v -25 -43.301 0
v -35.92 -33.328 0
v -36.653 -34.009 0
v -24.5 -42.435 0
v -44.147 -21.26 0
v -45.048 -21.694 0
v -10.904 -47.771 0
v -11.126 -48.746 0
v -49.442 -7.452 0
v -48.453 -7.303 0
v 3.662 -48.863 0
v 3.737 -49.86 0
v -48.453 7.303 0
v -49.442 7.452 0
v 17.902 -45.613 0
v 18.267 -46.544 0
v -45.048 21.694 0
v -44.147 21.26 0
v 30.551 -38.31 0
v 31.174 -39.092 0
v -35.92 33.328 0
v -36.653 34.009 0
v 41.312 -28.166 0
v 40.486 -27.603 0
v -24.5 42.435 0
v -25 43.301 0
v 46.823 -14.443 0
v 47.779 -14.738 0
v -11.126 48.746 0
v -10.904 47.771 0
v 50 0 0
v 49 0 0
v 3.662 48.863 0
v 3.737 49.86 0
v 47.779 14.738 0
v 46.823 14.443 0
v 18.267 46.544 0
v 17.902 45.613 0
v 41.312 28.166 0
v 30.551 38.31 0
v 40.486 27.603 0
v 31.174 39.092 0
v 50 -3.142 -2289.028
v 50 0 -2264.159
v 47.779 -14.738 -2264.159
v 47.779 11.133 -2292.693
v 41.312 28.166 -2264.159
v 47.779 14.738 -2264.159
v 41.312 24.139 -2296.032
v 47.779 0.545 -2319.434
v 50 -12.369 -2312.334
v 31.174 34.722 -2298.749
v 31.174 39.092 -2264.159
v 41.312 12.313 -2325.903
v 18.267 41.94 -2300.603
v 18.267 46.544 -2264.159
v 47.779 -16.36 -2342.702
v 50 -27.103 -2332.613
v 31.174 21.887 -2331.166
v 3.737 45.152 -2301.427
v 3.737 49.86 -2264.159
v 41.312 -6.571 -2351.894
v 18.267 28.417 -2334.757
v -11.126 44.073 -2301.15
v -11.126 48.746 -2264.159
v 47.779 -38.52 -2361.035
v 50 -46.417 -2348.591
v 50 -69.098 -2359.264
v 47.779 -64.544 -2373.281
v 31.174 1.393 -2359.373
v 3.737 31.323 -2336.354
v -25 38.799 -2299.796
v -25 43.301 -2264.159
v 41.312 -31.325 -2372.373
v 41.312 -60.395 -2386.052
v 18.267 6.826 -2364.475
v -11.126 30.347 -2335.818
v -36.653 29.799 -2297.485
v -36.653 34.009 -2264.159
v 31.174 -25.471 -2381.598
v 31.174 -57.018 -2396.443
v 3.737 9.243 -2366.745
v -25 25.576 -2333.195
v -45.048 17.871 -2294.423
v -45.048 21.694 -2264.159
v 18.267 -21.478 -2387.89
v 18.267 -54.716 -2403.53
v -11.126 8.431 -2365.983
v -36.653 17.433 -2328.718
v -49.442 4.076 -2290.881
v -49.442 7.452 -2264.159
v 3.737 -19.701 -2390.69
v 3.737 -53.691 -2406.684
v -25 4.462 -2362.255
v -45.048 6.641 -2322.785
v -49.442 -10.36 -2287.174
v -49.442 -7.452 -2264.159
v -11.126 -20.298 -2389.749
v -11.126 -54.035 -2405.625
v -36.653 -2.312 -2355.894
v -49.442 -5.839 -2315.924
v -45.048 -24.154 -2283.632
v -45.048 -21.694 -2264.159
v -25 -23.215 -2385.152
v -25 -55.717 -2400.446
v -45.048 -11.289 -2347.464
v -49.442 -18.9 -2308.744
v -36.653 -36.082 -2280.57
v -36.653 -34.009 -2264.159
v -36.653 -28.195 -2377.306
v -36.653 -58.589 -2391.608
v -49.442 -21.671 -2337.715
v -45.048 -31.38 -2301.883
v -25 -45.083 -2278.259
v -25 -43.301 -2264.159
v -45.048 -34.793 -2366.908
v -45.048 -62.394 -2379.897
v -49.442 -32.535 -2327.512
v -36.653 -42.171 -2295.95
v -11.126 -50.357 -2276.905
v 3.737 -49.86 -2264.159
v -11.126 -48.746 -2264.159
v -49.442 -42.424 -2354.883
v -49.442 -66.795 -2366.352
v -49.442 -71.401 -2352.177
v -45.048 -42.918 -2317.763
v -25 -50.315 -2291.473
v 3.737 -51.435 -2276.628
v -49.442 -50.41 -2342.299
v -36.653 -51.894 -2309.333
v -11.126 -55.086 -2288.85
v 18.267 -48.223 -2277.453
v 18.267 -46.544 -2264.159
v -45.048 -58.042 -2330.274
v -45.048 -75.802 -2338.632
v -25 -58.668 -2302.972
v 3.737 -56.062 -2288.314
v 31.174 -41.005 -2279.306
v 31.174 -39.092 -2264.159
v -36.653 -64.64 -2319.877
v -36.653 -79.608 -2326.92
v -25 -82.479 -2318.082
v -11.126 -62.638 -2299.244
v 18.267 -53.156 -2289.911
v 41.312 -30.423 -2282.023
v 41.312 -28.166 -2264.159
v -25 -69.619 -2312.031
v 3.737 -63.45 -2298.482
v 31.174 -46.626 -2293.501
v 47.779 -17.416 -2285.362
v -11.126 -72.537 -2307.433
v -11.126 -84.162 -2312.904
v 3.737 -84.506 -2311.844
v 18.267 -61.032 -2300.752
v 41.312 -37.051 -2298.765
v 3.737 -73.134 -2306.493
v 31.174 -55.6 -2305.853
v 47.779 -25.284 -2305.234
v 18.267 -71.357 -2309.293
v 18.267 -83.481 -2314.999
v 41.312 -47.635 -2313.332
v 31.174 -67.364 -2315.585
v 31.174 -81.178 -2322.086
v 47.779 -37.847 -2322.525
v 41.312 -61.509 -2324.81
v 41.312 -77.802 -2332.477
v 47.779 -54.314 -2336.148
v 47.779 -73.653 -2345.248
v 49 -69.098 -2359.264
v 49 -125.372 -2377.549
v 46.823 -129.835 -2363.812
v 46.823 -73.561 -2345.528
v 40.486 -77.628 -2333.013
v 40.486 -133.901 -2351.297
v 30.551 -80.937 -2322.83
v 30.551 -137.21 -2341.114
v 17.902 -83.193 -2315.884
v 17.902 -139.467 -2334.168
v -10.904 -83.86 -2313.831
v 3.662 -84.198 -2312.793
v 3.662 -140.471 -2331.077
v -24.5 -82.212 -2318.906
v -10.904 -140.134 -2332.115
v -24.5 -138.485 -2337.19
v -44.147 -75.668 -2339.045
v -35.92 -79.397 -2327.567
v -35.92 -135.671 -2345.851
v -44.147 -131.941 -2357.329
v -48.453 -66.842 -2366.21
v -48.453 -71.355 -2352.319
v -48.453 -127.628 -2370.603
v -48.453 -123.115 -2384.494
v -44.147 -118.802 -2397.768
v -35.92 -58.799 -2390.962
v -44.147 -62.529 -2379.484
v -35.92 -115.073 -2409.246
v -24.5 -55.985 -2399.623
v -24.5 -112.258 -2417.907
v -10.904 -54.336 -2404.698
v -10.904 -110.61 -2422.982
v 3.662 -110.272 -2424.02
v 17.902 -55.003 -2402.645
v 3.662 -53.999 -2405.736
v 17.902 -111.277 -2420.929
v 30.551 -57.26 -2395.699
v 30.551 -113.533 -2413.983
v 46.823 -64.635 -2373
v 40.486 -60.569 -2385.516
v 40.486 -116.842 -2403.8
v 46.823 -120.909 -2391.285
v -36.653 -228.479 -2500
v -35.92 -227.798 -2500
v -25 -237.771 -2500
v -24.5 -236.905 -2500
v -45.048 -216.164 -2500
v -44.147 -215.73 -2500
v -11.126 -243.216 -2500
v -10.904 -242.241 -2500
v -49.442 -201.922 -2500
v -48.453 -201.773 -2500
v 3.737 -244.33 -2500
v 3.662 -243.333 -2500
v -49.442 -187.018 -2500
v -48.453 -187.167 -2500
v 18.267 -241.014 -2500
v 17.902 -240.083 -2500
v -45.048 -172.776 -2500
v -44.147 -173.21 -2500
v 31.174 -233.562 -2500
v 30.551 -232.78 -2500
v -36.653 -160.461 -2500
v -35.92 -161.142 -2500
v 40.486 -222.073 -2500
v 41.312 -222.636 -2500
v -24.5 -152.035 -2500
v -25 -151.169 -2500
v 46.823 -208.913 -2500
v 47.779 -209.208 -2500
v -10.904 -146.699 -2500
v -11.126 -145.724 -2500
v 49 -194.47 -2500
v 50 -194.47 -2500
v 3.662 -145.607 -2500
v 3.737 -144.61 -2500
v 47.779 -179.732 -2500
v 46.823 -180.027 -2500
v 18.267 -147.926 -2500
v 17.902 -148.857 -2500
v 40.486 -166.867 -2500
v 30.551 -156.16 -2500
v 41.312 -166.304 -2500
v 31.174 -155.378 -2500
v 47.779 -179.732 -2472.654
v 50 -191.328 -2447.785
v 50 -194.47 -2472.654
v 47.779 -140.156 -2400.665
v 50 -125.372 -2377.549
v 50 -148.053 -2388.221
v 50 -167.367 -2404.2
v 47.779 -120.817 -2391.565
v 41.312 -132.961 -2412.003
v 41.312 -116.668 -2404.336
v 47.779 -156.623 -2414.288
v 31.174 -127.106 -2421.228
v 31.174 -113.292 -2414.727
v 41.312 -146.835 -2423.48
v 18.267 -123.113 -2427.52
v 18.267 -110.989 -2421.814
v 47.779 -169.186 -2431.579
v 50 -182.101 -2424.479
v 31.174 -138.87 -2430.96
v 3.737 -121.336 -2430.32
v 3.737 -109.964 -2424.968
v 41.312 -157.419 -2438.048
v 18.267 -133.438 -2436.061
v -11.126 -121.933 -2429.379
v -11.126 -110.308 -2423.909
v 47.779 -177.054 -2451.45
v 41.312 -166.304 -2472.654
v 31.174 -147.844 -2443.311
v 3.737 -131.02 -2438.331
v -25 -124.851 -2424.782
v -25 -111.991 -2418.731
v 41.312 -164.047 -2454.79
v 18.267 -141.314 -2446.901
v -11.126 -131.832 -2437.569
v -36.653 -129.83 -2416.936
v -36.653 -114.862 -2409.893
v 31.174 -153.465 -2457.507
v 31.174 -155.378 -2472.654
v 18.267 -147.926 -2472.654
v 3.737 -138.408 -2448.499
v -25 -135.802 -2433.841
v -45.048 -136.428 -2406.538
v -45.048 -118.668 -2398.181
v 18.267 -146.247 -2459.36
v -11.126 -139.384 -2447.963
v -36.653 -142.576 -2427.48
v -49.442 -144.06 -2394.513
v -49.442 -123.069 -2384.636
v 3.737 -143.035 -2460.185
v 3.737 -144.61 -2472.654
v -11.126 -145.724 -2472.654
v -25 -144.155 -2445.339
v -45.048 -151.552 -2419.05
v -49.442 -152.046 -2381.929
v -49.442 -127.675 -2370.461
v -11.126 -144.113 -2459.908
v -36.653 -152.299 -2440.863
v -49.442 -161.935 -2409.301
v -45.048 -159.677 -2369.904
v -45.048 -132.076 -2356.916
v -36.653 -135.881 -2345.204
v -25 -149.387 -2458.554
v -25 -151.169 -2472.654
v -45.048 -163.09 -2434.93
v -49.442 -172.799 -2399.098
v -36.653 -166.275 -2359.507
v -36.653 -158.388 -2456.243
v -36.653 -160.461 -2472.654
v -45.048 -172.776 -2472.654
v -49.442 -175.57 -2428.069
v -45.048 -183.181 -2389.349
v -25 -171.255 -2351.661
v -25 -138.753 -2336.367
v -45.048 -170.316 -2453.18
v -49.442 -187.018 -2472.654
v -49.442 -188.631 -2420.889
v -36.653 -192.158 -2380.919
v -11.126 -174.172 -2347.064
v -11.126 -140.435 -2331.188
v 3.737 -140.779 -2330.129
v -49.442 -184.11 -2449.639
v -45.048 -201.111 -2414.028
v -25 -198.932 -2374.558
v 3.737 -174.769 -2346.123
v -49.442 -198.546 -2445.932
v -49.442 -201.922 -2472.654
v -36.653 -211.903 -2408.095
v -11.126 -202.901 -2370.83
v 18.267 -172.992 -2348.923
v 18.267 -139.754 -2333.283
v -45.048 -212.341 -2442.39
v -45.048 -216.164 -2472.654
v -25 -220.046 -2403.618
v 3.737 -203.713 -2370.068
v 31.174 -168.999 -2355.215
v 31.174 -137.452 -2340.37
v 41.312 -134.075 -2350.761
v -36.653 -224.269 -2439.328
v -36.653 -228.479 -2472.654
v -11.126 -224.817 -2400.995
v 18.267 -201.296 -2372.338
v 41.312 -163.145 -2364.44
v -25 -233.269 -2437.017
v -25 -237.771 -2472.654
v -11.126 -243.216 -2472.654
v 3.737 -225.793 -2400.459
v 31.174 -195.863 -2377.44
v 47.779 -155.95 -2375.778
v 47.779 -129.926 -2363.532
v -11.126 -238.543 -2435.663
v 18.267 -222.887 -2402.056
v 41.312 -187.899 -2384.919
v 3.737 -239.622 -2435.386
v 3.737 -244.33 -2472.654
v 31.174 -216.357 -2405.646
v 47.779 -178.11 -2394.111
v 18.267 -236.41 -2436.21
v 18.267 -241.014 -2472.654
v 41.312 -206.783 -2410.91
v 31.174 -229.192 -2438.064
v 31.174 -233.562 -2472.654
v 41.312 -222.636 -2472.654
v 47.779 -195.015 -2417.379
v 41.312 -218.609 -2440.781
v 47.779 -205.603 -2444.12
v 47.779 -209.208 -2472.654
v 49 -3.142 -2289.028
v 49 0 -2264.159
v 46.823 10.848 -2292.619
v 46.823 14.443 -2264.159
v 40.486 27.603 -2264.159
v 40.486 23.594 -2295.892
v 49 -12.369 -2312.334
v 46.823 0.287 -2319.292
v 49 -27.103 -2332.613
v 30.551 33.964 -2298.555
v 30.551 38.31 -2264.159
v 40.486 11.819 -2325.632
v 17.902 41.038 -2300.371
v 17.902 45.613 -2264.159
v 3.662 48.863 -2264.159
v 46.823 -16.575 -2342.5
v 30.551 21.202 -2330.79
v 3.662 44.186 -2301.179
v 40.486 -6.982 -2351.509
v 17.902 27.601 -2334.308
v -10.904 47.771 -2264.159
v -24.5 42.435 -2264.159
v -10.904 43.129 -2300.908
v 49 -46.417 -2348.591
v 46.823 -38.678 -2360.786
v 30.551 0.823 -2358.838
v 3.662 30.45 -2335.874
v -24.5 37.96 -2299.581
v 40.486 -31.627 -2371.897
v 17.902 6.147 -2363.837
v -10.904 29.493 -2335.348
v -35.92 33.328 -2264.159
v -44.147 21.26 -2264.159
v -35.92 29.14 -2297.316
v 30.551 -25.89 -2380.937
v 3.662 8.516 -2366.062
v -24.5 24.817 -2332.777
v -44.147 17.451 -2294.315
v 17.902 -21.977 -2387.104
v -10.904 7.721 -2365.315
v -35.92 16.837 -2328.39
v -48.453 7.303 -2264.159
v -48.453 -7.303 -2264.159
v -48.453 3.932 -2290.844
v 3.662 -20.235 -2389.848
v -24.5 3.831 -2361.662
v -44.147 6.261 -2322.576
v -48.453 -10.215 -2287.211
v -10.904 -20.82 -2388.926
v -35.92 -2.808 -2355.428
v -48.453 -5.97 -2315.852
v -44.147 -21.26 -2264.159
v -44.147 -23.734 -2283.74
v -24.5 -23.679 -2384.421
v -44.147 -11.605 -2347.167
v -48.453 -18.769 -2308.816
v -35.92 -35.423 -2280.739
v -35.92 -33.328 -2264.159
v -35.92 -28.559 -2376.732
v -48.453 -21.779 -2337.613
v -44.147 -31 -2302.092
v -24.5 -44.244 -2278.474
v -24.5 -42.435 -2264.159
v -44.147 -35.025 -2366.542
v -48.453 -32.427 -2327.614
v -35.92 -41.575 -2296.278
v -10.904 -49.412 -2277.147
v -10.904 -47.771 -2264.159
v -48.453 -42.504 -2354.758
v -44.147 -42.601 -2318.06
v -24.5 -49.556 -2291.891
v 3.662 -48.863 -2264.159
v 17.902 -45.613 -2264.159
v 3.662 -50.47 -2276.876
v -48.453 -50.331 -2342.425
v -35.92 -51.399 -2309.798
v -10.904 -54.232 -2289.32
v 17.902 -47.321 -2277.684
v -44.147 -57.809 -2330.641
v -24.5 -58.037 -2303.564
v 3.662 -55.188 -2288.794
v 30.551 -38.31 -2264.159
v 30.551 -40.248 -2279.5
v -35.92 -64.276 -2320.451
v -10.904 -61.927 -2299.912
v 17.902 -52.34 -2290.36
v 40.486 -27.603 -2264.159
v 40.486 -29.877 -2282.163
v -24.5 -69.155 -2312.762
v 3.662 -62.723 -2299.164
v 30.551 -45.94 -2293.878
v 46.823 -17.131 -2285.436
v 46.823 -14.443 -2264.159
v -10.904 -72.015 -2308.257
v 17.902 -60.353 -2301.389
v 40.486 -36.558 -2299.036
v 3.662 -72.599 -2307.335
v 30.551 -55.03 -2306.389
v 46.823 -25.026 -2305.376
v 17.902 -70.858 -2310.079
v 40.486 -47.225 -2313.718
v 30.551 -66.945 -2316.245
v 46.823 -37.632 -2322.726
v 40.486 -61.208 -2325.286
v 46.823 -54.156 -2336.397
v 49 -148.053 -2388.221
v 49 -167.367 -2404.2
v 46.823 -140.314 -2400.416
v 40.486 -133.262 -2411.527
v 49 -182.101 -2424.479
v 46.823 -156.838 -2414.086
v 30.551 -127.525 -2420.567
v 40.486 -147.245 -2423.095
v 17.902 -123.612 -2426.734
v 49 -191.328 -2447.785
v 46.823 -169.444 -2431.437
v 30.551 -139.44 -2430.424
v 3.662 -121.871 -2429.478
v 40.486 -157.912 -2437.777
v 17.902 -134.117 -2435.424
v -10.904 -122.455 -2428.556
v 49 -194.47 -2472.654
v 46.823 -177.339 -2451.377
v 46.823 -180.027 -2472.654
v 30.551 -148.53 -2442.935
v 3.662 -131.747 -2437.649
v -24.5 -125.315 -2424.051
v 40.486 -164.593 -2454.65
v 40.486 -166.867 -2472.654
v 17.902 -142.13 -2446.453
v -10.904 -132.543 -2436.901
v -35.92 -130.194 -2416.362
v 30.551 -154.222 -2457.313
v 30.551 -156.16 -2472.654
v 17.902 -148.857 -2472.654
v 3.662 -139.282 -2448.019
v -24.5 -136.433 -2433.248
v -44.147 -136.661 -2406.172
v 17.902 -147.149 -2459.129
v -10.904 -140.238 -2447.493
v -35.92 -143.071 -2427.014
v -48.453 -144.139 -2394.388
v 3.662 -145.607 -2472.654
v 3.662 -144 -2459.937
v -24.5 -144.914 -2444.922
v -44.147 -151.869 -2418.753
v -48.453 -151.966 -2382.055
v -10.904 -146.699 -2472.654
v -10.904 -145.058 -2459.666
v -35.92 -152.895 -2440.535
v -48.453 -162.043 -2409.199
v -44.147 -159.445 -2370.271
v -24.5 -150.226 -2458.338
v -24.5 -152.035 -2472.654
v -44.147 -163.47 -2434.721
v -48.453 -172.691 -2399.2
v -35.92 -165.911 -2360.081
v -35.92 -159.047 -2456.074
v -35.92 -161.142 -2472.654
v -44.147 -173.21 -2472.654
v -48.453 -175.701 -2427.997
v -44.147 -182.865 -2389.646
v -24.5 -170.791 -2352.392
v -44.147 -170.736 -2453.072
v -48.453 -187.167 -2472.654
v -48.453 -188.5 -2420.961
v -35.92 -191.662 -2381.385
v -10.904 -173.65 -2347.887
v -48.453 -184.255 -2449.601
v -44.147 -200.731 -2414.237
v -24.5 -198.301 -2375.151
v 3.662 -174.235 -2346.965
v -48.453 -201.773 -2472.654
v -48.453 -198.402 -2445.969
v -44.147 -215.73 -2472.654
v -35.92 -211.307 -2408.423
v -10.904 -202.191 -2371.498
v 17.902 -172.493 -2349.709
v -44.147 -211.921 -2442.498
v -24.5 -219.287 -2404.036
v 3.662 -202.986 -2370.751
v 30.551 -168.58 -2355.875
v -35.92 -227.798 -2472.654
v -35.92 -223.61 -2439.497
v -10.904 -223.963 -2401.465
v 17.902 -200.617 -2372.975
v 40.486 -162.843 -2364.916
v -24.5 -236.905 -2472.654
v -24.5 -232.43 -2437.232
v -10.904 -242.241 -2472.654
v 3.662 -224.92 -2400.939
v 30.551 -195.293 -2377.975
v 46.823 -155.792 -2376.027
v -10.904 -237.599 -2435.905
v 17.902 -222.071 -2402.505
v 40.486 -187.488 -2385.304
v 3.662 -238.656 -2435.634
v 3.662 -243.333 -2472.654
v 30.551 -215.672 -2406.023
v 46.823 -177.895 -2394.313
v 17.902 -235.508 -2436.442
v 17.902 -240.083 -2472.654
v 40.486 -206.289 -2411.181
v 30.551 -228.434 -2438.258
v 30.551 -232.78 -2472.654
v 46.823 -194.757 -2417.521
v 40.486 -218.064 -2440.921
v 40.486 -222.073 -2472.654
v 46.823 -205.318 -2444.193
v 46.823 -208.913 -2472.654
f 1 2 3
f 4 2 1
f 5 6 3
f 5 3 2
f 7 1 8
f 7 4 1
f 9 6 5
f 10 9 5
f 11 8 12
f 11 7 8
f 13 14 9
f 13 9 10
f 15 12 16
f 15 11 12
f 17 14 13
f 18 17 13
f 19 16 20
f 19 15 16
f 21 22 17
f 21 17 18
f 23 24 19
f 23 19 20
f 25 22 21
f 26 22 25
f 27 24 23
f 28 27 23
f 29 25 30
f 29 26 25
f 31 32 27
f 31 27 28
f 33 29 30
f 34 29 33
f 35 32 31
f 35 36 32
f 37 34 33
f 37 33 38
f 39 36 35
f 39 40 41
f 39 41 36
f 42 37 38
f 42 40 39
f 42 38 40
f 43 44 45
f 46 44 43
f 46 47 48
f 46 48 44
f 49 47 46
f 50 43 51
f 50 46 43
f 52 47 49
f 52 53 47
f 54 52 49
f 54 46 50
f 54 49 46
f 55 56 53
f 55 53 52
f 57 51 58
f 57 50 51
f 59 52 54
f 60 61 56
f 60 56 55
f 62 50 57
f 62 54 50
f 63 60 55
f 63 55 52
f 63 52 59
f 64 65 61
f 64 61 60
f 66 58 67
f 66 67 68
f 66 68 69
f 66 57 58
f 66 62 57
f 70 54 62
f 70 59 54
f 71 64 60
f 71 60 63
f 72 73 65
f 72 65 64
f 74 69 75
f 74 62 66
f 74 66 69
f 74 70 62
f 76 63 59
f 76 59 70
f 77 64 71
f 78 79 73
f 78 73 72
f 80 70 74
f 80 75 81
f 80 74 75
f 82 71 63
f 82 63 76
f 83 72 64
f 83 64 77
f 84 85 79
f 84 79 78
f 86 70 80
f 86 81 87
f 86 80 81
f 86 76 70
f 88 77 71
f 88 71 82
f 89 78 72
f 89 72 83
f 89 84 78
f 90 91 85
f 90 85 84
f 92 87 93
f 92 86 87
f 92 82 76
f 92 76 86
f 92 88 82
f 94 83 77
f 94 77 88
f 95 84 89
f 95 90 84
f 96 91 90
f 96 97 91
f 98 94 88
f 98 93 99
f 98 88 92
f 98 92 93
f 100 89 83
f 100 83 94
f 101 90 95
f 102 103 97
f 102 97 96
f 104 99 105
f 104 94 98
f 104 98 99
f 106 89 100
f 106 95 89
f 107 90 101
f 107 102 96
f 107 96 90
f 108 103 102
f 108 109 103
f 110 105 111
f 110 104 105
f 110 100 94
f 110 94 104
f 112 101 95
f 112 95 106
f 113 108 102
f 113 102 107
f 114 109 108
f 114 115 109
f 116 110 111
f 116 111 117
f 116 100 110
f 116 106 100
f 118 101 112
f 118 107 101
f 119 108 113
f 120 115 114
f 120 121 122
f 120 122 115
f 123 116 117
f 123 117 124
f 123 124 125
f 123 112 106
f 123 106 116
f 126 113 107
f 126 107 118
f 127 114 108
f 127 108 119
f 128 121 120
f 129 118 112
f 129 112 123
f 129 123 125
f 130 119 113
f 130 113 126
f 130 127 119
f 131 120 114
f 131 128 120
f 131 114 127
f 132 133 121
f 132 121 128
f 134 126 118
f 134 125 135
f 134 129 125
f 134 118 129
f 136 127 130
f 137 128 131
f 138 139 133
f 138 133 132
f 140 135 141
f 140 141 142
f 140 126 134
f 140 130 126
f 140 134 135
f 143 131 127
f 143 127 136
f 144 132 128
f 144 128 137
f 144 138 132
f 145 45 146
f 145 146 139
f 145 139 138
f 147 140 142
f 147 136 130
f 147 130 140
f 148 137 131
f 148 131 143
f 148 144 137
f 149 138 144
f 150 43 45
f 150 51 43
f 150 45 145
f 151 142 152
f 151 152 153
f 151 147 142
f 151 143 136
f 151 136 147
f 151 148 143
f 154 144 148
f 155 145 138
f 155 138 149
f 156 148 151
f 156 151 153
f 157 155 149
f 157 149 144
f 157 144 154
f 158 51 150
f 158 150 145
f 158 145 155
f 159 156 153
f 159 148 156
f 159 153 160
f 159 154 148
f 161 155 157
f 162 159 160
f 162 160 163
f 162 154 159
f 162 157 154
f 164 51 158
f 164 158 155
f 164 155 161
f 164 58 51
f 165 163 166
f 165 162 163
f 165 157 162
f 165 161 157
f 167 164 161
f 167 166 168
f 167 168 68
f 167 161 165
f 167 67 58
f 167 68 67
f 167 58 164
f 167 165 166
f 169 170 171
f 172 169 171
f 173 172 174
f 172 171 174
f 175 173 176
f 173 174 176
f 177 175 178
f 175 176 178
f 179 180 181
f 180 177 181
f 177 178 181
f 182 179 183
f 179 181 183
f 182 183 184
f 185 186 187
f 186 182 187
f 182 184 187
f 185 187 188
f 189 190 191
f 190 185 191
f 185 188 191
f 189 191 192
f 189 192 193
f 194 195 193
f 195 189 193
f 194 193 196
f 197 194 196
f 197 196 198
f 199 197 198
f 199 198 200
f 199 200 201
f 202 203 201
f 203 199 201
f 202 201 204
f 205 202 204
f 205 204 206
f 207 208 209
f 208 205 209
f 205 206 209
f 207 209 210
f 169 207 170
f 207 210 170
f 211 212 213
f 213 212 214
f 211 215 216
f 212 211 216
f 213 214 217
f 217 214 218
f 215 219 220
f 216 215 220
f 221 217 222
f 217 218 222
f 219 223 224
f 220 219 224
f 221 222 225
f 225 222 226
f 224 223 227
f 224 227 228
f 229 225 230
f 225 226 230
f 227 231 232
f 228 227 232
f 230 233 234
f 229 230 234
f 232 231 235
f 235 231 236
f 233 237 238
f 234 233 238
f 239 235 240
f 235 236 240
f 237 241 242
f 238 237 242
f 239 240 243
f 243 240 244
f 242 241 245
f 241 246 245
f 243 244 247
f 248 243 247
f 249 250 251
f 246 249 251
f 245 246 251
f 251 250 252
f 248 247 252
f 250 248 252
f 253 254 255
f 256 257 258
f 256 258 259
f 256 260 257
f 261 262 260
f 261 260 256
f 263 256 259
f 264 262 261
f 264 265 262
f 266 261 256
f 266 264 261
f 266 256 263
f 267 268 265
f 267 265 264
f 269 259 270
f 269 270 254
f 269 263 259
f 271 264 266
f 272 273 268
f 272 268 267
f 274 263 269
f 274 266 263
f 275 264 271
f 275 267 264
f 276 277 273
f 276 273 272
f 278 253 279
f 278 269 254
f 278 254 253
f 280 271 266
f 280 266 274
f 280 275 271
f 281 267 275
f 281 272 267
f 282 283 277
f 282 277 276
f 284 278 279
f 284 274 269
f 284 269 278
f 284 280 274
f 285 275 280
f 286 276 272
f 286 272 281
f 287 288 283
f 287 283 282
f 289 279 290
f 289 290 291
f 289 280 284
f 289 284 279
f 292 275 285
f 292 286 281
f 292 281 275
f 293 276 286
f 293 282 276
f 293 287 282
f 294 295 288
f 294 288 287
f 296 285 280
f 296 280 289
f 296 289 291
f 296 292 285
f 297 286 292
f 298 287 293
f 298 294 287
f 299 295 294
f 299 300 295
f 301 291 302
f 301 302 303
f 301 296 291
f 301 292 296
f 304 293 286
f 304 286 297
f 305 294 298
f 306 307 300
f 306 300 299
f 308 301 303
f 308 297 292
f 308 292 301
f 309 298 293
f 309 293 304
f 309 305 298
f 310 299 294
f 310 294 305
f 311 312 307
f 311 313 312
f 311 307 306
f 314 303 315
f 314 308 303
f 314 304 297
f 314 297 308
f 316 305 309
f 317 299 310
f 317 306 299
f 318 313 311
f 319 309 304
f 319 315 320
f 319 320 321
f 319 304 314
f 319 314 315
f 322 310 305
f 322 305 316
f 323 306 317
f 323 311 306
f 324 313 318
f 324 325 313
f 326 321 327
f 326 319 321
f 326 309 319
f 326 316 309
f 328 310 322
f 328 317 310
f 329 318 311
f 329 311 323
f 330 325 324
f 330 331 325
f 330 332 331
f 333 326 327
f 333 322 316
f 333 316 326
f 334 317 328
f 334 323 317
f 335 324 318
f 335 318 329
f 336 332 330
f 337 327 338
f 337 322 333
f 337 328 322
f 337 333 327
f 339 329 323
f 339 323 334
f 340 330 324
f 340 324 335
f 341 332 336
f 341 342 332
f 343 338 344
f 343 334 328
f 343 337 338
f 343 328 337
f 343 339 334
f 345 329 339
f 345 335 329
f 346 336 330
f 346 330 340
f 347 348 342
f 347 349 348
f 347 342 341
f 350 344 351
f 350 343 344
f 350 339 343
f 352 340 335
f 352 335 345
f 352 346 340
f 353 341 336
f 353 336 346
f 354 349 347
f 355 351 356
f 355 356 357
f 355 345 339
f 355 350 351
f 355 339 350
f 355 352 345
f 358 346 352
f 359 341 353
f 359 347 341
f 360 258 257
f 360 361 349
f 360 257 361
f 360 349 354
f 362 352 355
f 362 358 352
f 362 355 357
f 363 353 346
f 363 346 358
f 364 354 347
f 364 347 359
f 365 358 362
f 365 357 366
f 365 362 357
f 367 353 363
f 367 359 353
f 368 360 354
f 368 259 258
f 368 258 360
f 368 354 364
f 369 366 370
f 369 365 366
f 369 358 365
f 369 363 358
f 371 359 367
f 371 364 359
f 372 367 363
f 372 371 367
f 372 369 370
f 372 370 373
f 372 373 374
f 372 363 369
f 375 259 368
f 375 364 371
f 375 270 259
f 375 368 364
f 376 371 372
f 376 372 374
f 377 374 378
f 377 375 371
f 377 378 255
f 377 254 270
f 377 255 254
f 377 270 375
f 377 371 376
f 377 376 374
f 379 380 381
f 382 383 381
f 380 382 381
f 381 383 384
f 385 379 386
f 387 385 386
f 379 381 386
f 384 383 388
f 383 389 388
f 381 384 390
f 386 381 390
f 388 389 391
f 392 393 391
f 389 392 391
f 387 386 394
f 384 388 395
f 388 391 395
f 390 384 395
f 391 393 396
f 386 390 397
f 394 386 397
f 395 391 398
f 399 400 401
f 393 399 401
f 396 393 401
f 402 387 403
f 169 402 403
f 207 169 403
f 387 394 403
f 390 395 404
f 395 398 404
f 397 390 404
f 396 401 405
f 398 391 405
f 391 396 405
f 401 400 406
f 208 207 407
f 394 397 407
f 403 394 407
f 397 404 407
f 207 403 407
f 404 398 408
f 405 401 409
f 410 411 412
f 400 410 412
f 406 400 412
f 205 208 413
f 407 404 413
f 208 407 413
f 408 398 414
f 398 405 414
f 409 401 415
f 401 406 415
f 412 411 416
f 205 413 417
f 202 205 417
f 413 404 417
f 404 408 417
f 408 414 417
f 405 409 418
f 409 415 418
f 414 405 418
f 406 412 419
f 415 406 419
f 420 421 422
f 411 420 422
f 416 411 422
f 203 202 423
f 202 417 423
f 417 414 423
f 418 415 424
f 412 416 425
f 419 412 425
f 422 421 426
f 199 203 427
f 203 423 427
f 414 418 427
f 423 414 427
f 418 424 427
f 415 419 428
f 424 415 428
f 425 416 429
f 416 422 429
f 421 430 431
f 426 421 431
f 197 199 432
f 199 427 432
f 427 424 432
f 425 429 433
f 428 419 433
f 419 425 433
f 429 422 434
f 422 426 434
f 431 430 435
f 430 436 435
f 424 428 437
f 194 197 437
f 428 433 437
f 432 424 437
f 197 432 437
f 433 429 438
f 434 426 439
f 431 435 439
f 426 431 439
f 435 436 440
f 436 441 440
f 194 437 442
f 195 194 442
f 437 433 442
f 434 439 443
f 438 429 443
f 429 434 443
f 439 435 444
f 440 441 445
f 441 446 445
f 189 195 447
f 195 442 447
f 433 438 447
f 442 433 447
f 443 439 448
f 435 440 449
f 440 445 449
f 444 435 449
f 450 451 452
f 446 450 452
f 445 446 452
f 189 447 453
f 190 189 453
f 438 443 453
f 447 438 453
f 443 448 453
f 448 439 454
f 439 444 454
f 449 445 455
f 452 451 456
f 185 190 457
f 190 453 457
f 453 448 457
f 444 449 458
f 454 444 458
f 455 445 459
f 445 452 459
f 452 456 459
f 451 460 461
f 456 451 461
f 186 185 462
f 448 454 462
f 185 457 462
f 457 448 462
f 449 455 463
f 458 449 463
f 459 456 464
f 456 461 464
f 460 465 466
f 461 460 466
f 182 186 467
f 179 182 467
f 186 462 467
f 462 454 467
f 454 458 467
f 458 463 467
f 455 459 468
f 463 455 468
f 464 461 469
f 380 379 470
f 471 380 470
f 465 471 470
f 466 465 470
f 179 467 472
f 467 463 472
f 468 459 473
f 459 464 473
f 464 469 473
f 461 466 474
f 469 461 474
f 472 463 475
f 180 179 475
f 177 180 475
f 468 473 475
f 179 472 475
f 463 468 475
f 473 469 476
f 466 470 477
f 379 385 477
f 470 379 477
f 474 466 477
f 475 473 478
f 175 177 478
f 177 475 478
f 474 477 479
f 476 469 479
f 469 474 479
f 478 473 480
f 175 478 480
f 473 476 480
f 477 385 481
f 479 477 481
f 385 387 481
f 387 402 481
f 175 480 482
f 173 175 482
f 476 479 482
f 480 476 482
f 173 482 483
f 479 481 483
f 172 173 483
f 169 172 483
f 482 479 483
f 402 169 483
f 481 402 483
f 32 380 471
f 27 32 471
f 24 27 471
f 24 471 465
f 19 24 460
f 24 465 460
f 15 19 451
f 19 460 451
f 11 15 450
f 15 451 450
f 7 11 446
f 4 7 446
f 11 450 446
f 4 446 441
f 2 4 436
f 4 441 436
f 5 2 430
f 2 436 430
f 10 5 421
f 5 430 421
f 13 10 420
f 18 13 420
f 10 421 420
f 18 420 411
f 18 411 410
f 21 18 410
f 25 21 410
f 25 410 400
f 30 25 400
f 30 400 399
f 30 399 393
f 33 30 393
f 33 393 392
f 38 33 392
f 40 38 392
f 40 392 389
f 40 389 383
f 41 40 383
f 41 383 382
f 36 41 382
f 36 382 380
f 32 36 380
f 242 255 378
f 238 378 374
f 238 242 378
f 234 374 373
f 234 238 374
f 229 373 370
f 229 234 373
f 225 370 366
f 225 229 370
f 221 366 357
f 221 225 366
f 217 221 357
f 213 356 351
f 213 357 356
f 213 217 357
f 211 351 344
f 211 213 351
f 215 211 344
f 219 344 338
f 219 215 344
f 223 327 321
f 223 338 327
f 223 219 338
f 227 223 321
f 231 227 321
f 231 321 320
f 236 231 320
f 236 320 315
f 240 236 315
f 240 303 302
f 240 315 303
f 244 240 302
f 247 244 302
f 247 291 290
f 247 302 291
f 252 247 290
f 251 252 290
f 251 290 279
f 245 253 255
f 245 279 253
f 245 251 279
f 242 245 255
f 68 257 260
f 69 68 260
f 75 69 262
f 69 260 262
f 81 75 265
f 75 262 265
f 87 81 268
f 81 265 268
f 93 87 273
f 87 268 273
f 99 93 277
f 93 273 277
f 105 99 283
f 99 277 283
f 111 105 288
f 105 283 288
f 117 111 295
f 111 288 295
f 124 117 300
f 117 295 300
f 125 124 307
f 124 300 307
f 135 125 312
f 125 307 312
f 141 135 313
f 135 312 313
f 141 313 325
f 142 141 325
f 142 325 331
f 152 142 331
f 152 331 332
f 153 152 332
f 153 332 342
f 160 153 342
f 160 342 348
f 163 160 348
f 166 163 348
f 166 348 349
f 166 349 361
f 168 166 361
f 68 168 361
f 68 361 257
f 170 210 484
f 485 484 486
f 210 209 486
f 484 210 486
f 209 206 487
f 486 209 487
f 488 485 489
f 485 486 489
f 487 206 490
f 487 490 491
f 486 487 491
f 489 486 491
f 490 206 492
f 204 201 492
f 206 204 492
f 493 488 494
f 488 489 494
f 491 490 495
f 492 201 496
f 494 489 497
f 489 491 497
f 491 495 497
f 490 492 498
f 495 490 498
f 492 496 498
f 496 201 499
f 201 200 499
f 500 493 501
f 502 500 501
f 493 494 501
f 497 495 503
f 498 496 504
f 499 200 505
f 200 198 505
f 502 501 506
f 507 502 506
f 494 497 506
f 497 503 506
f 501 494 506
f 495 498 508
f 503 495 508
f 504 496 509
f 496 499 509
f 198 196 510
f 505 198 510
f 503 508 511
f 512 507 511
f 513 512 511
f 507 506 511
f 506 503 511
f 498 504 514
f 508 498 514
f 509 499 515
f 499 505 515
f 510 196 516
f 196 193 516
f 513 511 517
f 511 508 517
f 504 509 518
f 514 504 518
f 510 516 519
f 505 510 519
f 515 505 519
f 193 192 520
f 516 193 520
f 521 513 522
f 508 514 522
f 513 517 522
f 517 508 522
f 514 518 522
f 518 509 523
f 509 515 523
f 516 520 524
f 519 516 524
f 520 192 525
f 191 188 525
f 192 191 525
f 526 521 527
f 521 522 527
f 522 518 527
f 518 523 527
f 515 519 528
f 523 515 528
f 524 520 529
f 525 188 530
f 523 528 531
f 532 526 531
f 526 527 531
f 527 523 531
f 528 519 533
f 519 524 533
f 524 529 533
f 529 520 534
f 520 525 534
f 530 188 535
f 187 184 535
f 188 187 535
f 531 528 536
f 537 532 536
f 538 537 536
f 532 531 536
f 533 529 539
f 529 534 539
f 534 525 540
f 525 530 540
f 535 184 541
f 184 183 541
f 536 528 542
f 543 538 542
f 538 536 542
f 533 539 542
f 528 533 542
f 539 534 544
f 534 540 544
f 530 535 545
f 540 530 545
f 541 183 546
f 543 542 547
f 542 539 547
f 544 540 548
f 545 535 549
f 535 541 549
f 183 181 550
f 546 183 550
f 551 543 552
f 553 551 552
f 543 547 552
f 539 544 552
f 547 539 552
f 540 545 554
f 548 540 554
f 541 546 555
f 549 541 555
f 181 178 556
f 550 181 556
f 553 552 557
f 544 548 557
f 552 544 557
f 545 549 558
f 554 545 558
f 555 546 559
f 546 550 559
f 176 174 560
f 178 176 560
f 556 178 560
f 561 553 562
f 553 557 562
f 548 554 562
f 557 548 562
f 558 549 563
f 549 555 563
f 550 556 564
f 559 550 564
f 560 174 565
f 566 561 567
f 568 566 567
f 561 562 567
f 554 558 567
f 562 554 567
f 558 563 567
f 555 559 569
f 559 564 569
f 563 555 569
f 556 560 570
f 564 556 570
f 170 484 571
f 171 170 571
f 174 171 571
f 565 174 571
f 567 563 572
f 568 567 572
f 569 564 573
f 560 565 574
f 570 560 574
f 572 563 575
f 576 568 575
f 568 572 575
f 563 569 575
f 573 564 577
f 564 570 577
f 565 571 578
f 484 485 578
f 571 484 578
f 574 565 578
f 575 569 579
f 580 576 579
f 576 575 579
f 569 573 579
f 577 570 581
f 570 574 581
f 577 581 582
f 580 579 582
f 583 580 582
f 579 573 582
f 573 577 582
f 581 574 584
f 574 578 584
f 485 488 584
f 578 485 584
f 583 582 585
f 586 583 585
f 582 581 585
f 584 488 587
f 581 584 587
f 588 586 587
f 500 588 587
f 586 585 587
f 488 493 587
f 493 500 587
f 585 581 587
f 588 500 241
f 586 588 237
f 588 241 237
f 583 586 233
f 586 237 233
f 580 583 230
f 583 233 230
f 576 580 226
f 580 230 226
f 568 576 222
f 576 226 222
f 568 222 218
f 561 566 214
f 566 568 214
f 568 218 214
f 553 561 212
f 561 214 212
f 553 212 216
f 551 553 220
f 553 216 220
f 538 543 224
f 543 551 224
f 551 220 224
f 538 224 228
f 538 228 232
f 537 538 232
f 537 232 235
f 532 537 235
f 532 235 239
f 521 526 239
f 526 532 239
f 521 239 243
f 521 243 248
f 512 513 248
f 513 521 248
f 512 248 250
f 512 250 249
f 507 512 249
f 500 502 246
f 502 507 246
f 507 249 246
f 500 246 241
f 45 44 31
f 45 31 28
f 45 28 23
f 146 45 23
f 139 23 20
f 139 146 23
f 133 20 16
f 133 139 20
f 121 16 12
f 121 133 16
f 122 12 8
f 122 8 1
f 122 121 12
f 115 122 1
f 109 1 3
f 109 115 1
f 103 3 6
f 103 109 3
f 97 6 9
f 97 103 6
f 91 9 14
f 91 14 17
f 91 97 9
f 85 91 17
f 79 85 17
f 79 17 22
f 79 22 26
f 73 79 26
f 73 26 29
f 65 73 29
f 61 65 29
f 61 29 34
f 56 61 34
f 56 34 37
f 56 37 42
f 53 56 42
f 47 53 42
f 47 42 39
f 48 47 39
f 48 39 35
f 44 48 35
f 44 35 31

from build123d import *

# Parameters (mm, degrees)
F1_R   = 50
F1_R_2 = 49


with BuildPart() as f2:
    # F2: sweep along a path in F0
    with BuildLine(Plane.YZ) as f2_path:
        Line((0, 0), (0, -2264.158614))
        ThreePointArc((0, -2264.158614), (-19.098301, -2322.937139), (-69.098301, -2359.264266))
        Line((-69.098301, -2359.264266), (-125.371699, -2377.548601))
        ThreePointArc((-125.371699, -2377.548601), (-175.371699, -2413.875728), (-194.47, -2472.654253))
        Line((-194.47, -2472.654253), (-194.47, -2500))
    # F1 (on Top) → F2 (sweep)
    with BuildSketch(Plane.XY):
        Circle(F1_R)
        Circle(F1_R_2, mode=Mode.SUBTRACT)
    sweep(path=f2_path.line)


solid = f2.part
